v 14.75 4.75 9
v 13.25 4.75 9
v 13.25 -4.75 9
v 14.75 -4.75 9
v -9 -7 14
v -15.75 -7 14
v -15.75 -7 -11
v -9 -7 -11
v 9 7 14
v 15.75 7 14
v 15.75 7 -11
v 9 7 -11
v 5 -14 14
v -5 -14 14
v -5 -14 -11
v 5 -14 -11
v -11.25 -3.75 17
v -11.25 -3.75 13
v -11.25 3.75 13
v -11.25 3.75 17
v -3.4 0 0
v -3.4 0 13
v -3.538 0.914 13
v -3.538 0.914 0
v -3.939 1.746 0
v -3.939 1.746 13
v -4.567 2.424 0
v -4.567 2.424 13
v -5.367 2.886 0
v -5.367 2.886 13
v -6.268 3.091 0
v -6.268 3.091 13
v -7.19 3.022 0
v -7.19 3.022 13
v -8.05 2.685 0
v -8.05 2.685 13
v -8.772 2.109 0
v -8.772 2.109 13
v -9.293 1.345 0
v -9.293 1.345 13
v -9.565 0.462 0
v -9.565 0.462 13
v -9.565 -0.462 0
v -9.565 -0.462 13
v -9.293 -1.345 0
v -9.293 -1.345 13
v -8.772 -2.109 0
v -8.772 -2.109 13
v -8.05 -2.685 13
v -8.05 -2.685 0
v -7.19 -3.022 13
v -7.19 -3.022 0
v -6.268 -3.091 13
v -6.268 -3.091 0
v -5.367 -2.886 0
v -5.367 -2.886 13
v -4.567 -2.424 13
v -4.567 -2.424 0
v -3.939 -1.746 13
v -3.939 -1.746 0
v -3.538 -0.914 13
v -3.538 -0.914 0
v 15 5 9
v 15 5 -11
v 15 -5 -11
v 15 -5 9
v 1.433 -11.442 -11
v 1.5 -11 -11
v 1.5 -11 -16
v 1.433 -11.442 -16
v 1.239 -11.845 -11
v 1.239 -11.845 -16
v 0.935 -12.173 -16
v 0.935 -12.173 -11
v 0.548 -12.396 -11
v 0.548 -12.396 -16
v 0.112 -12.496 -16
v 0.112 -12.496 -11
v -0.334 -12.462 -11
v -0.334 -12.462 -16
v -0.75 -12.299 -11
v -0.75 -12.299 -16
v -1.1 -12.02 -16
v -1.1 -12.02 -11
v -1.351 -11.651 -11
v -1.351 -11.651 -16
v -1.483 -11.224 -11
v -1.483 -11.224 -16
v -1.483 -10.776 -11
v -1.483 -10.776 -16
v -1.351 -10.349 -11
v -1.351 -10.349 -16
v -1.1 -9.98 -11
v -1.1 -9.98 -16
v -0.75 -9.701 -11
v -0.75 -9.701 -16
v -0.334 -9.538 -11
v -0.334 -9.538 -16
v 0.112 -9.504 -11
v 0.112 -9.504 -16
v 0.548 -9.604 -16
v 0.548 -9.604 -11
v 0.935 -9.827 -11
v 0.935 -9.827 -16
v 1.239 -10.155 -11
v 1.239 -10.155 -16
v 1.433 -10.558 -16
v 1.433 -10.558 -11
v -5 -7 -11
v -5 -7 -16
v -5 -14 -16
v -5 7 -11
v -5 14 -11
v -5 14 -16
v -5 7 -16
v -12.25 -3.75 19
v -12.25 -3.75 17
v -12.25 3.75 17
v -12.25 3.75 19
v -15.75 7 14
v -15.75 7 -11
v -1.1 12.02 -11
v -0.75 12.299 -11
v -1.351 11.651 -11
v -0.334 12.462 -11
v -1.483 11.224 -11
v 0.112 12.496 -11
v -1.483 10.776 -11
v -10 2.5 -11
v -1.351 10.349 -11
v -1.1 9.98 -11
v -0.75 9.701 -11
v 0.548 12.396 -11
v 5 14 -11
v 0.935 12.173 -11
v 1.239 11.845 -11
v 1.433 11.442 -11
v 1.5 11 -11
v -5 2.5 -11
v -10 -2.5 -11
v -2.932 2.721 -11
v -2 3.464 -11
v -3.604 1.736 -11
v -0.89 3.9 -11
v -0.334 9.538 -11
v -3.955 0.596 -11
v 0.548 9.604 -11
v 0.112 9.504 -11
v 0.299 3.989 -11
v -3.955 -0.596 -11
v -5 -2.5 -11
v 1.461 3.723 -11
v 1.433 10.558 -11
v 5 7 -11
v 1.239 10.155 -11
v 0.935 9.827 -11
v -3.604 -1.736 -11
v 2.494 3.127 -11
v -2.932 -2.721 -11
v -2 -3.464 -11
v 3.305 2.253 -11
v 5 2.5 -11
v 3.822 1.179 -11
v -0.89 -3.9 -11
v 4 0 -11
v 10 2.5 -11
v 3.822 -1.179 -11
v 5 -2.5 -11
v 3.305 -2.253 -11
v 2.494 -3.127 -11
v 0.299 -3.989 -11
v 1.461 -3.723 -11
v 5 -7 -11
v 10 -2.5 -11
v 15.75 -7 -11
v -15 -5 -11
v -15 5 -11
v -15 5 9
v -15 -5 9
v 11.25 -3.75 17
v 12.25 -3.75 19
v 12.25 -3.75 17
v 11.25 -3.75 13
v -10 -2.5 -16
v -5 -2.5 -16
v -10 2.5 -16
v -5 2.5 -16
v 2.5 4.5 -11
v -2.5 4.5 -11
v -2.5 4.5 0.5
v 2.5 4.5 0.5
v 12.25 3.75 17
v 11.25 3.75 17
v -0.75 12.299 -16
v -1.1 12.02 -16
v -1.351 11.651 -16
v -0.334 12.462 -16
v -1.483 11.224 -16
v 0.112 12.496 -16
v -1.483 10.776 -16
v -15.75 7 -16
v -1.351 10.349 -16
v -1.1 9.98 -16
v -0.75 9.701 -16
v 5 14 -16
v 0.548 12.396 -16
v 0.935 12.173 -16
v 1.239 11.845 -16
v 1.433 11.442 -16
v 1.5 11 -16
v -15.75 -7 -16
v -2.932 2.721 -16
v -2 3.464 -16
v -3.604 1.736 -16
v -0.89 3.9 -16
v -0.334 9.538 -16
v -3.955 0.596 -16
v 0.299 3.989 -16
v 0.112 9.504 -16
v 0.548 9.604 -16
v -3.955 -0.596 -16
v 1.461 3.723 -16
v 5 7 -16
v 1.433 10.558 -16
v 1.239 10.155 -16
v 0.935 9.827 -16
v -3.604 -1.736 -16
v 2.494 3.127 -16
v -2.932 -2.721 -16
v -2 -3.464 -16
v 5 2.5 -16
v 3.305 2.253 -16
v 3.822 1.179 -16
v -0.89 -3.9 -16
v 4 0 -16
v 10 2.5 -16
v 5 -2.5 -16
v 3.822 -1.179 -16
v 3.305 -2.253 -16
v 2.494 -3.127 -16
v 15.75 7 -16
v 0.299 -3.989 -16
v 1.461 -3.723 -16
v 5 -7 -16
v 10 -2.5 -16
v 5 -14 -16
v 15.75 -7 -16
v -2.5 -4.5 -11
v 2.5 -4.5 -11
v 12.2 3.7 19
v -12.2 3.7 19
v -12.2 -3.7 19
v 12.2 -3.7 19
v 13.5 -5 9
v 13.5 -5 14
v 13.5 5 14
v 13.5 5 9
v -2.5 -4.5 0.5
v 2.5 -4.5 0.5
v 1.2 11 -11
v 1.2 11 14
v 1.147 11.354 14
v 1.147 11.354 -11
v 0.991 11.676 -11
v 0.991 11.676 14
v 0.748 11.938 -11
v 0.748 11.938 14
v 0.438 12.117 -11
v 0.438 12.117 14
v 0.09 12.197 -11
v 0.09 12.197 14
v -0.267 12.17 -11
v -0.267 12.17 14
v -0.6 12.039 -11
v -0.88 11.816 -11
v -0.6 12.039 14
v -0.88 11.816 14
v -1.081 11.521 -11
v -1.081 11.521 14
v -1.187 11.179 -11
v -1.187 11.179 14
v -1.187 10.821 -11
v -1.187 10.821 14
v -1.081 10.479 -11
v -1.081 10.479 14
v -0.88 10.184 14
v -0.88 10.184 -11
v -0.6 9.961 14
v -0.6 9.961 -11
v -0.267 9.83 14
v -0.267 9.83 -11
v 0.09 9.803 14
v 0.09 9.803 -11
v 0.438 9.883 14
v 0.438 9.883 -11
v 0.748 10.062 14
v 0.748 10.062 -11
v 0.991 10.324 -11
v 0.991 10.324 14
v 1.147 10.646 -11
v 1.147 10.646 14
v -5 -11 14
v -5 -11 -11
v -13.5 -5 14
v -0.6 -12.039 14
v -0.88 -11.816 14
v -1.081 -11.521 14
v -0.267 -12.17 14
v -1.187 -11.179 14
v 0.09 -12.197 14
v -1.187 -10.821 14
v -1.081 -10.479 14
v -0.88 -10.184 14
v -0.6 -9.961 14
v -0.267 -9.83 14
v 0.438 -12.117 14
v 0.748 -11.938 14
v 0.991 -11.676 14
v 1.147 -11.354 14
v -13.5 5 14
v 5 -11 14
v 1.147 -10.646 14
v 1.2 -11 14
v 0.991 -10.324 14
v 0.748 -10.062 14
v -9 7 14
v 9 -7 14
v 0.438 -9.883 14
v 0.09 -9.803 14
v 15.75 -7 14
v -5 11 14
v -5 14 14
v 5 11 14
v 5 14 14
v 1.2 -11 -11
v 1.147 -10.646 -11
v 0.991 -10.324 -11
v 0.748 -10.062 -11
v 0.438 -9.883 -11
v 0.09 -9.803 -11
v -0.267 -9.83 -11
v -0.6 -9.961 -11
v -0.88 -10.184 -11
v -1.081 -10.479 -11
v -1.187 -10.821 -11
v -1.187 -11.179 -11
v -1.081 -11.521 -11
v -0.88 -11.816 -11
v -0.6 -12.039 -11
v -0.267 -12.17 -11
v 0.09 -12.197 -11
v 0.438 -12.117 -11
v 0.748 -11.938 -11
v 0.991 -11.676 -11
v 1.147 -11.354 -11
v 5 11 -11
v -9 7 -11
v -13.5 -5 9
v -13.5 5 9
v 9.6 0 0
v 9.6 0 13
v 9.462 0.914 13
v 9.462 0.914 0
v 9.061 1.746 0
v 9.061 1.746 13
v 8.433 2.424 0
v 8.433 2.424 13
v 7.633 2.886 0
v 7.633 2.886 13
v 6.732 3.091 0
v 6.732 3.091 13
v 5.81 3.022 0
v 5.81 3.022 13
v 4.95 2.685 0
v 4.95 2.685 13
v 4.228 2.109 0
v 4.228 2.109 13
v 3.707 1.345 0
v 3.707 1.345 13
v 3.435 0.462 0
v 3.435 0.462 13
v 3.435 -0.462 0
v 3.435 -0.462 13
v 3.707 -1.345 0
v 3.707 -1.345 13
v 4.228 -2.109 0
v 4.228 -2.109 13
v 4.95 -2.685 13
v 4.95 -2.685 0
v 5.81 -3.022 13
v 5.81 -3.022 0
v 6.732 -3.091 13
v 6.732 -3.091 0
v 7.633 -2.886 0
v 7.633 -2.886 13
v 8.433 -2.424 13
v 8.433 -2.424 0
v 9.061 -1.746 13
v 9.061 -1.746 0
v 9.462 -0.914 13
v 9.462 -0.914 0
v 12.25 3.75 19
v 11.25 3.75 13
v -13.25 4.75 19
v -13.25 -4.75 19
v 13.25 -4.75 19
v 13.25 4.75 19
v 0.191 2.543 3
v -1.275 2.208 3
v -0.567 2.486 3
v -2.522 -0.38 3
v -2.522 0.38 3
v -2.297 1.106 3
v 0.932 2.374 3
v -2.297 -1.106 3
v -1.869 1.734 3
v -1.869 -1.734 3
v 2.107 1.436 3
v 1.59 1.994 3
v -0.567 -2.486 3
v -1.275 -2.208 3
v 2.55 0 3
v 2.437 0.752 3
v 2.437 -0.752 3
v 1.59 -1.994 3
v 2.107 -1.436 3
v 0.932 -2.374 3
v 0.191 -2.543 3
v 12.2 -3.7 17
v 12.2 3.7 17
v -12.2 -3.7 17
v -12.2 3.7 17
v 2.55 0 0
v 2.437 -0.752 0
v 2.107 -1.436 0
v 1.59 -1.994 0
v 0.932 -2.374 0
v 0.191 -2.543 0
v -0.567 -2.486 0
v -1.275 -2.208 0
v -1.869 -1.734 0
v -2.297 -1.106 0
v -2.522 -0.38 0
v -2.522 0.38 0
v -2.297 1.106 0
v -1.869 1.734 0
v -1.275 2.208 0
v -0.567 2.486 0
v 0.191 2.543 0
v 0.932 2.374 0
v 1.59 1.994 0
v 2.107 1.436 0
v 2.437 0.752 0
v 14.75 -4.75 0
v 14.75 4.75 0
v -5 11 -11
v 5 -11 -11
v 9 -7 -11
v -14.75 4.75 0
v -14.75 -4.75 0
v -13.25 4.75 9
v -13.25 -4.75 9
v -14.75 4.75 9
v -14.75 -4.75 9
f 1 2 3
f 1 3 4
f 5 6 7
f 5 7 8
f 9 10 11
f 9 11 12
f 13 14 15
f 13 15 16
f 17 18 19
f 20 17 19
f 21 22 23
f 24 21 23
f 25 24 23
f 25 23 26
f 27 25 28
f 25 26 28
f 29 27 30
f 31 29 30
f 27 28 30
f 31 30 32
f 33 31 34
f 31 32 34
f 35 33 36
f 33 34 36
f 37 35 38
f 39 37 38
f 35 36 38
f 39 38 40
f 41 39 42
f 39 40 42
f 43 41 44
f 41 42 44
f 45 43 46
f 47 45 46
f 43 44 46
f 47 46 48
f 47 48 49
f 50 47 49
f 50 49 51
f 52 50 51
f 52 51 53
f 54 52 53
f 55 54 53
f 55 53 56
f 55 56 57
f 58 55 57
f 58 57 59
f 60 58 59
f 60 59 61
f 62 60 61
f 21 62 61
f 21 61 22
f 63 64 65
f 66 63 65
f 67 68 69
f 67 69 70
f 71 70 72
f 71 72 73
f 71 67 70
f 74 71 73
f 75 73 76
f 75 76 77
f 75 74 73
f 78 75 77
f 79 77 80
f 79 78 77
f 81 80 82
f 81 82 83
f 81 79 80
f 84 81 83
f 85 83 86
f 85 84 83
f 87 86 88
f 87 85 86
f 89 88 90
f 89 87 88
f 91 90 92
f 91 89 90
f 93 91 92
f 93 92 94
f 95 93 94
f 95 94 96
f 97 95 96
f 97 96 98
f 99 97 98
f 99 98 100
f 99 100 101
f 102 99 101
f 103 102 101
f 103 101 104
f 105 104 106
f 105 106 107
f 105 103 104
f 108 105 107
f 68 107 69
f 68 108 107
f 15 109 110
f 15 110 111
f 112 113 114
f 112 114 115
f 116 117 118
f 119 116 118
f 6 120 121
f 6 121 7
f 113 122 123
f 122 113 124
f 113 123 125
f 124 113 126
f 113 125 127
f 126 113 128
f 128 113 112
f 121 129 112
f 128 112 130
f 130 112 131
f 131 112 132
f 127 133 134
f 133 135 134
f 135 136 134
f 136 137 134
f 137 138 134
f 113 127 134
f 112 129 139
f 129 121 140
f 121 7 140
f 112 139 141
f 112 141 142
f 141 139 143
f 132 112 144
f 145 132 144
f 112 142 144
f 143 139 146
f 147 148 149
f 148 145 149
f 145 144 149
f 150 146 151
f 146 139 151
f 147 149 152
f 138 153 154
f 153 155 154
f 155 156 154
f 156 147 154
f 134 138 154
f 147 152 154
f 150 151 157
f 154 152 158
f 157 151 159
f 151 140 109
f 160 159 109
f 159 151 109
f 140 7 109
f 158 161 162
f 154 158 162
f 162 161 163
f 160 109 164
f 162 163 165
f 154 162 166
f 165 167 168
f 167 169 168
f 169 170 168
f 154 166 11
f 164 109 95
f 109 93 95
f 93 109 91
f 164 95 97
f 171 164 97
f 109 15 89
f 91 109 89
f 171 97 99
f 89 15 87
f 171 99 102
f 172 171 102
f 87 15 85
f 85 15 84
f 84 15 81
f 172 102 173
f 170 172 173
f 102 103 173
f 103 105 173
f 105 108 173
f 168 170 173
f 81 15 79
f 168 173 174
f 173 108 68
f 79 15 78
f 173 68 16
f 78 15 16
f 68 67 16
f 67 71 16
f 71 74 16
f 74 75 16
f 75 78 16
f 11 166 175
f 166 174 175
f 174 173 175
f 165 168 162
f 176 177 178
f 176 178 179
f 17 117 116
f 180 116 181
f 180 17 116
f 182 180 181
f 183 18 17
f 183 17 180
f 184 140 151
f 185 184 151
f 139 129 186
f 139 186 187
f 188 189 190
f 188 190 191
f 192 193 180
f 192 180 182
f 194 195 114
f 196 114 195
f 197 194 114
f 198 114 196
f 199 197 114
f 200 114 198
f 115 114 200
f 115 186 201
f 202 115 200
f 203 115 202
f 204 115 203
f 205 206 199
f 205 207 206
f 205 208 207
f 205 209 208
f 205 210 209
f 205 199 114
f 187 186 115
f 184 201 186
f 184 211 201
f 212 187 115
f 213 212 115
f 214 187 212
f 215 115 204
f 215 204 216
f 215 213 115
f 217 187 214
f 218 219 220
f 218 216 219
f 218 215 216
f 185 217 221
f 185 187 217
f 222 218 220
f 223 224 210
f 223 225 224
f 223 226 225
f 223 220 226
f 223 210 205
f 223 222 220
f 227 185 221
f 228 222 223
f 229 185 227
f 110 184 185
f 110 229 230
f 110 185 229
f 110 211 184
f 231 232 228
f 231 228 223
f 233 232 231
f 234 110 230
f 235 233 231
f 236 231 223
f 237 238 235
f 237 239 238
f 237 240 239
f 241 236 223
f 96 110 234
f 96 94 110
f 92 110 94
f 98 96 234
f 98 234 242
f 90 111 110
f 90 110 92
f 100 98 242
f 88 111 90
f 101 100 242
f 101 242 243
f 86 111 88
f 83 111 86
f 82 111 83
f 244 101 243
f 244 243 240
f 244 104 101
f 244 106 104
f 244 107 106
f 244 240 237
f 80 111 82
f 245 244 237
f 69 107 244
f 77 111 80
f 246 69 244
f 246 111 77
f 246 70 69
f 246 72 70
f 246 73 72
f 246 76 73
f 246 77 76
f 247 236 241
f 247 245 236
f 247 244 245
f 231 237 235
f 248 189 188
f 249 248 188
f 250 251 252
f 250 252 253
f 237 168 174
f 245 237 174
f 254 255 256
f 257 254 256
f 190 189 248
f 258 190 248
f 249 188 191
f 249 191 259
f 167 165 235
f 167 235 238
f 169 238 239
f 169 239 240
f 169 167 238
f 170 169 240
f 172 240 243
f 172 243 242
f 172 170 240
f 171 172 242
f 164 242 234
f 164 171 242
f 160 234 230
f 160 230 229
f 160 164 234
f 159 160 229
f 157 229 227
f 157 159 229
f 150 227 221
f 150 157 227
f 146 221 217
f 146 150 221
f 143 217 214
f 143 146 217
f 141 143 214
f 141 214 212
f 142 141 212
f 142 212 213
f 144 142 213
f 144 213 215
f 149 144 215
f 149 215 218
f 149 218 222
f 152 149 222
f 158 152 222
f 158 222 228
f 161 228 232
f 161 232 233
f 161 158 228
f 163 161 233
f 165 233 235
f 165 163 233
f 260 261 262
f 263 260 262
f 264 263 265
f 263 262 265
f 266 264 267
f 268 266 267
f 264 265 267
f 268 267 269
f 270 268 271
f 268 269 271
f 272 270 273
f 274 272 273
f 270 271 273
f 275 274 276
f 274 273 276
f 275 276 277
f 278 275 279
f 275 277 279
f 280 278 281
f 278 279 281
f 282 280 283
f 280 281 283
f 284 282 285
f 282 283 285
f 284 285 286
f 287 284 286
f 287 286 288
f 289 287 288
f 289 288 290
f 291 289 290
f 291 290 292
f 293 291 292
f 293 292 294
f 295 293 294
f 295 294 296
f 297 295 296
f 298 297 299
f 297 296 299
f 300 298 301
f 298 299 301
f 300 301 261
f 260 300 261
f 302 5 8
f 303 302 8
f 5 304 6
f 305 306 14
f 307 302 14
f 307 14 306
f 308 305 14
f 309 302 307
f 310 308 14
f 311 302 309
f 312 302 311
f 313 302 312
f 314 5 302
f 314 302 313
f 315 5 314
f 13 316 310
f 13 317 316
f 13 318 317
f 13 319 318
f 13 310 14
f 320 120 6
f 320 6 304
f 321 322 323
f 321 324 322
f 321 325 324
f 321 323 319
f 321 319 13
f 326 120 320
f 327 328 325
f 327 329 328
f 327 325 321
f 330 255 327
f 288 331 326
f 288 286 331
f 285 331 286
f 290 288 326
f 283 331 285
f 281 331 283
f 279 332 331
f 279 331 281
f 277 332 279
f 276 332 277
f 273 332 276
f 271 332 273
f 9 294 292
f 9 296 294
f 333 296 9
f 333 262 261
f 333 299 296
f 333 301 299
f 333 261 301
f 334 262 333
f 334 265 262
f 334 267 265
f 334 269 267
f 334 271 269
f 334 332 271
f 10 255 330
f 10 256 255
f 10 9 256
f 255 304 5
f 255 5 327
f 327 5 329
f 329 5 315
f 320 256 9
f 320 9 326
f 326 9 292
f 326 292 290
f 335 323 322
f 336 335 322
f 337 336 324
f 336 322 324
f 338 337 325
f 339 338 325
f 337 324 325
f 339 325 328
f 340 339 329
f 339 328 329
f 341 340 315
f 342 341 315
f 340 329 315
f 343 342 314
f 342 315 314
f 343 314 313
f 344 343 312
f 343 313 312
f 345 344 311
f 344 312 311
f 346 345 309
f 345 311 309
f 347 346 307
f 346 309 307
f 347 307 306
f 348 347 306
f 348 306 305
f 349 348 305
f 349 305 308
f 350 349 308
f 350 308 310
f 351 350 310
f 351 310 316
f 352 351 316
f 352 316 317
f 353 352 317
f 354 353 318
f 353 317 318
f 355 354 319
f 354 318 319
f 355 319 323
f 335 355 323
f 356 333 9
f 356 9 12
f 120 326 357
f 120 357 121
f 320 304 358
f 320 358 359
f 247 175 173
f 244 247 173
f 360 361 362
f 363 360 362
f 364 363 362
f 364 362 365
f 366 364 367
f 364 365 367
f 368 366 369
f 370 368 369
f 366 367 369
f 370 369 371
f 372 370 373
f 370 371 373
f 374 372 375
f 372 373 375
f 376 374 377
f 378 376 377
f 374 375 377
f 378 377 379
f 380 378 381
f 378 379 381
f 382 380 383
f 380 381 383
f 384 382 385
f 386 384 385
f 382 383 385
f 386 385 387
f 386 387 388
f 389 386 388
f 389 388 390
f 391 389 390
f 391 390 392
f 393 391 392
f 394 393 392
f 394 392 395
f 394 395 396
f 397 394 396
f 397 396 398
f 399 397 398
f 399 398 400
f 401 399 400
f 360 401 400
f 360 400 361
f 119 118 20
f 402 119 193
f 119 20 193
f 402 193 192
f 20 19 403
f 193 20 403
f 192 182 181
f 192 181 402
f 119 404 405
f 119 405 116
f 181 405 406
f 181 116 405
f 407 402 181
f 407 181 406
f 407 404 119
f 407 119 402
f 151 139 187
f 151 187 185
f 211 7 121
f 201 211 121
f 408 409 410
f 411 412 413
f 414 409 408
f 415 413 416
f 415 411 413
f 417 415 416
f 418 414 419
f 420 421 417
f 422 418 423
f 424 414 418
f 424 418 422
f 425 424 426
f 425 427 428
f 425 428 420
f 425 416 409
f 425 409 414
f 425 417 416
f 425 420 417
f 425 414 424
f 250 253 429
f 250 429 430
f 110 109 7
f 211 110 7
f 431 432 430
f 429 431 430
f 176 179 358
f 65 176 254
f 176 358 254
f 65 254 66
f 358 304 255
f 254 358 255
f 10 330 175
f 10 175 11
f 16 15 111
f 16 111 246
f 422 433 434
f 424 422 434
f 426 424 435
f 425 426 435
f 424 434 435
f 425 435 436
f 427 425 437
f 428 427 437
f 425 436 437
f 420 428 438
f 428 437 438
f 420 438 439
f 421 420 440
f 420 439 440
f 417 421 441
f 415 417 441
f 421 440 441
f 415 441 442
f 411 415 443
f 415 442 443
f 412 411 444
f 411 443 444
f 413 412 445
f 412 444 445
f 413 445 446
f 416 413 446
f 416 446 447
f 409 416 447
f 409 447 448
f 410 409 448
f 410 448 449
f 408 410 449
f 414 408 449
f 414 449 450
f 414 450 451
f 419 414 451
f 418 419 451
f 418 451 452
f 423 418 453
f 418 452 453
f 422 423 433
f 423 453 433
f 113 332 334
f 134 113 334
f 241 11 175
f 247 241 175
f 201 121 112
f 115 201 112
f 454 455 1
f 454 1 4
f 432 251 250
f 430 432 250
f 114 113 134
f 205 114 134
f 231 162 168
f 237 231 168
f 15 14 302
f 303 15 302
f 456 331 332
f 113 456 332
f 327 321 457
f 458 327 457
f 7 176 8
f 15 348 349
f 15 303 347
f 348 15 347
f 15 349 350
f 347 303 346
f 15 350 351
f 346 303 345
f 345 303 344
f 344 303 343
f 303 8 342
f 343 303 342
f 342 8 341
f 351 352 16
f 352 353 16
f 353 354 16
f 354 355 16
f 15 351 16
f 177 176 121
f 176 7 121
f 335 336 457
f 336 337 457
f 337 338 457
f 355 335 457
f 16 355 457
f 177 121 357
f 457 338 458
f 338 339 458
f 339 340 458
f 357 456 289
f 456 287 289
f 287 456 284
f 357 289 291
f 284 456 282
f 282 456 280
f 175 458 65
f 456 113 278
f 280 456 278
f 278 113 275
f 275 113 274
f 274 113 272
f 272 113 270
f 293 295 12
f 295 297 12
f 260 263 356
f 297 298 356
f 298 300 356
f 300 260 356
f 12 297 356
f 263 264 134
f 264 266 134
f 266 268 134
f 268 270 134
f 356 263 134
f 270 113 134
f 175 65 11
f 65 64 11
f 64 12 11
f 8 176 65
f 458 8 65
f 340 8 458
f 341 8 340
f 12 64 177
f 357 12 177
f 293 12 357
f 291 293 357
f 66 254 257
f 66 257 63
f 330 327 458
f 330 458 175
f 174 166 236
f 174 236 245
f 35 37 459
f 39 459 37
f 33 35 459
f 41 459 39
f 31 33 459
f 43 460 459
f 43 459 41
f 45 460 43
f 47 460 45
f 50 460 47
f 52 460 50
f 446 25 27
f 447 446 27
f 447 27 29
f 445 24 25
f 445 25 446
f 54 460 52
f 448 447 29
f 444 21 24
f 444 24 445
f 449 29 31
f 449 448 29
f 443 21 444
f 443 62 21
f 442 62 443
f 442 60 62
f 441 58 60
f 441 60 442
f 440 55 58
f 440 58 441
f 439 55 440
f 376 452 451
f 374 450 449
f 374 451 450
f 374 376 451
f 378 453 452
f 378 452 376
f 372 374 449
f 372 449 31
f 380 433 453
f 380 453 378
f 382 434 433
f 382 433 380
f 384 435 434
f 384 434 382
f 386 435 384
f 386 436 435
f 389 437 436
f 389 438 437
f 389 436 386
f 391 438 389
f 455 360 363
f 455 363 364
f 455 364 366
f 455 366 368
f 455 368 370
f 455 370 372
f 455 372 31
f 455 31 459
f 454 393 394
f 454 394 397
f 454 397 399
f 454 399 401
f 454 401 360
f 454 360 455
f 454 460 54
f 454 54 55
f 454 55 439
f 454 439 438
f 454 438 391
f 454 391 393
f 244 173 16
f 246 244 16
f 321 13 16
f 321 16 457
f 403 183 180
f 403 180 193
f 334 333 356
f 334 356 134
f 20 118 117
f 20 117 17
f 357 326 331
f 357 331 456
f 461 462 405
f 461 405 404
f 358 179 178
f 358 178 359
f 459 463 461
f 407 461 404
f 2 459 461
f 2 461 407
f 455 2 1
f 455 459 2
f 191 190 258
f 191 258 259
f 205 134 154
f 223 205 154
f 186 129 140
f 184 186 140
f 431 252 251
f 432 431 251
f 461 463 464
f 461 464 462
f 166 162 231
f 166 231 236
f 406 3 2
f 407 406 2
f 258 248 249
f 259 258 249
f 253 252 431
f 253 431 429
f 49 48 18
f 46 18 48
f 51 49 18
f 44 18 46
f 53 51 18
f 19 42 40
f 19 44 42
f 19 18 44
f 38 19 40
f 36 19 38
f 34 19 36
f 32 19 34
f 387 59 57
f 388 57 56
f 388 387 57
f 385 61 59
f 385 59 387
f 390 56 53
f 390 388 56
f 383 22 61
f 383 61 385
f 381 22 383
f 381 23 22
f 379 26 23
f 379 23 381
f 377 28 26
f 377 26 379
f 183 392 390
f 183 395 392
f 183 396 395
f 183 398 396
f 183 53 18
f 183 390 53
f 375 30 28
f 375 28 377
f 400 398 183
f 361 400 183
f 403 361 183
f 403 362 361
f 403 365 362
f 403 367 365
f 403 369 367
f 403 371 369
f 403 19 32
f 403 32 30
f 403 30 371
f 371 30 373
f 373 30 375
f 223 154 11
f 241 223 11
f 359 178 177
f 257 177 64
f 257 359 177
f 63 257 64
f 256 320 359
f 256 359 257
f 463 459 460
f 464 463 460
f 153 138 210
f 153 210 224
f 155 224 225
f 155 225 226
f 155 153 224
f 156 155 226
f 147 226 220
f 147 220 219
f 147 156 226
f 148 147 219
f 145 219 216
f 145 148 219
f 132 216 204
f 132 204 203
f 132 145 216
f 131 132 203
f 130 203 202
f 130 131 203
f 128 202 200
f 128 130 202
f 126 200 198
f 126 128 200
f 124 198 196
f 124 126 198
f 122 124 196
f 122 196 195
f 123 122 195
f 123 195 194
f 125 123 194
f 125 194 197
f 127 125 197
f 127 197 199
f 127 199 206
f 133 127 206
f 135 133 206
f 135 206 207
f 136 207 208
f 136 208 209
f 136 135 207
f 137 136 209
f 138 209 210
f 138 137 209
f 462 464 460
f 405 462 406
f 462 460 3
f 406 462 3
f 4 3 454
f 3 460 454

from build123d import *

# Parameters (mm, degrees)
F0_W      = 26.5
F0_H      = 9.5
F1_DEPTH  = 13
F2_W      = 26.5
F2_H      = 9.5
F2_W_2    = 24.5
F2_H_2    = 7.5
F3_DEPTH  = 6
F4_W      = 1
F4_H      = 7.5
F5_DEPTH  = 4
F6_R      = 3.1
F7_DEPTH  = 19
F8_W      = 1.5
F8_H      = 9.5
F9_DEPTH  = 9
F10_R     = 2.55
F11_DEPTH = 3
F13_W     = 27
F13_H     = 10
F13_W_2   = 10
F13_H_2   = 7
F14_DEPTH = 25
F15_W     = 30
F15_H     = 10
F16_DEPTH = 20
F17_R     = 1.2
F18_DEPTH = 25
F19_W     = 5
F19_H     = 5
F19_R     = 4
F19_W_2   = 10
F19_H_2   = 7
F19_R_2   = 1.5
F20_DEPTH = 5
F21_SIZE  = 4
F23_W     = 5
F23_H     = 9
F24_DEPTH = 11.5
F25_W     = 24.4
F25_H     = 7.4
F26_DEPTH = 2


with BuildPart() as f1:
    # F0 (on Top) → F1 (new body)
    with BuildSketch(Plane.XY):
        Rectangle(F0_W, F0_H)
    extrude(amount=F1_DEPTH)

    # F2 (on face) → F3 (join)
    with BuildSketch(Plane.XY.offset(13)):
        Rectangle(F2_W, F2_H)
        Rectangle(F2_W_2, F2_H_2, mode=Mode.SUBTRACT)
    extrude(amount=F3_DEPTH)

    # F4 (on face) → F5 (join)
    with BuildSketch(Plane.XY.offset(13)):
        with Locations((-11.75, 0)):
            Rectangle(F4_W, F4_H)
        with Locations((11.75, 0)):
            Rectangle(F4_W, F4_H)
    extrude(amount=F5_DEPTH)

    # F6 (on face) → F7 (cut)
    with BuildSketch(Plane.XY.offset(13)):
        with Locations((-6.5, 0)):
            Circle(F6_R)
        with Locations((6.5, 0)):
            Circle(F6_R)
    extrude(amount=-F7_DEPTH, mode=Mode.SUBTRACT)

    # F8 (on face) → F9 (join)
    with BuildSketch(Plane(origin=(0, 0, 0), x_dir=(1, 0, 0), z_dir=(0, 0, -1))):
        with Locations((-14, 0)):
            Rectangle(F8_W, F8_H)
        with Locations((14, 0)):
            Rectangle(F8_W, F8_H)
    extrude(amount=-F9_DEPTH)

    # F10 (on face) → F11 (cut)
    with BuildSketch(Plane(origin=(0, 0, 0), x_dir=(1, 0, 0), z_dir=(0, 0, -1))):
        Circle(F10_R)
    extrude(amount=-F11_DEPTH, mode=Mode.SUBTRACT)


with BuildPart() as f14:
    # F13 (on offset) → F14 (new body)
    with BuildSketch(Plane.XY.offset(14)):
        Polygon((5, -7), (15.75, -7), (15.75, 7), (5, 7), (-5, 7), (-15.75, 7), (-15.75, -7), (-5, -7), align=None)
        Rectangle(F13_W, F13_H, mode=Mode.SUBTRACT)
        with Locations((0, -10.5)):
            Rectangle(F13_W_2, F13_H_2)
        with Locations((0, 10.5)):
            Rectangle(F13_W_2, F13_H_2)
    extrude(amount=-F14_DEPTH)

    # F15 (on face) → F16 (cut)
    with BuildSketch(Plane(origin=(0, 0, -11), x_dir=(1, 0, 0), z_dir=(0, 0, -1))):
        Rectangle(F15_W, F15_H)
    extrude(amount=-F16_DEPTH, mode=Mode.SUBTRACT)

    # F17 (on face) → F18 (cut)
    with BuildSketch(Plane.XY.offset(14)):
        with Locations((0, 11)):
            Circle(F17_R)
        with Locations((0, -11)):
            Circle(F17_R)
    extrude(amount=-F18_DEPTH, mode=Mode.SUBTRACT)

    # F21
    f21_edges = [f14.edges().sort_by_distance(p)[0] for p in [
        (-5, 7, 1.5),
        (5, 7, 1.5),
        (5, -7, 1.5),
        (-5, -7, 1.5),
    ]]
    chamfer(f21_edges, length=F21_SIZE)


with BuildPart() as f20:
    # F19 (on face) → F20 (new body)
    with BuildSketch(Plane(origin=(0, 0, -11), x_dir=(1, 0, 0), z_dir=(0, 0, -1))):
        Polygon((5, -7), (15.75, -7), (15.75, 7), (5, 7), (-5, 7), (-15.75, 7), (-15.75, -7), (-5, -7), align=None)
        with Locations((-7.5, 0)):
            Rectangle(F19_W, F19_H, mode=Mode.SUBTRACT)
        Circle(F19_R, mode=Mode.SUBTRACT)
        with Locations((7.5, 0)):
            Rectangle(F19_W, F19_H, mode=Mode.SUBTRACT)
        with Locations((0, -10.5)):
            Rectangle(F19_W_2, F19_H_2)
        with Locations((0, -11)):
            Circle(F19_R_2, mode=Mode.SUBTRACT)
        with Locations((0, 10.5)):
            Rectangle(F19_W_2, F19_H_2)
        with Locations((0, 11)):
            Circle(F19_R_2, mode=Mode.SUBTRACT)
    extrude(amount=F20_DEPTH)


with BuildPart() as f24:
    # F23 (on offset) → F24 (new body)
    with BuildSketch(Plane(origin=(0, 0, -11), x_dir=(1, 0, 0), z_dir=(0, 0, -1))):
        Rectangle(F23_W, F23_H)
    extrude(amount=-F24_DEPTH)


with BuildPart() as f26:
    # F25 (on face) → F26 (new body)
    with BuildSketch(Plane.XY.offset(19)):
        Rectangle(F25_W, F25_H)
    extrude(amount=-F26_DEPTH)


solid = Compound([f1.part, f14.part, f20.part, f24.part, f26.part])
